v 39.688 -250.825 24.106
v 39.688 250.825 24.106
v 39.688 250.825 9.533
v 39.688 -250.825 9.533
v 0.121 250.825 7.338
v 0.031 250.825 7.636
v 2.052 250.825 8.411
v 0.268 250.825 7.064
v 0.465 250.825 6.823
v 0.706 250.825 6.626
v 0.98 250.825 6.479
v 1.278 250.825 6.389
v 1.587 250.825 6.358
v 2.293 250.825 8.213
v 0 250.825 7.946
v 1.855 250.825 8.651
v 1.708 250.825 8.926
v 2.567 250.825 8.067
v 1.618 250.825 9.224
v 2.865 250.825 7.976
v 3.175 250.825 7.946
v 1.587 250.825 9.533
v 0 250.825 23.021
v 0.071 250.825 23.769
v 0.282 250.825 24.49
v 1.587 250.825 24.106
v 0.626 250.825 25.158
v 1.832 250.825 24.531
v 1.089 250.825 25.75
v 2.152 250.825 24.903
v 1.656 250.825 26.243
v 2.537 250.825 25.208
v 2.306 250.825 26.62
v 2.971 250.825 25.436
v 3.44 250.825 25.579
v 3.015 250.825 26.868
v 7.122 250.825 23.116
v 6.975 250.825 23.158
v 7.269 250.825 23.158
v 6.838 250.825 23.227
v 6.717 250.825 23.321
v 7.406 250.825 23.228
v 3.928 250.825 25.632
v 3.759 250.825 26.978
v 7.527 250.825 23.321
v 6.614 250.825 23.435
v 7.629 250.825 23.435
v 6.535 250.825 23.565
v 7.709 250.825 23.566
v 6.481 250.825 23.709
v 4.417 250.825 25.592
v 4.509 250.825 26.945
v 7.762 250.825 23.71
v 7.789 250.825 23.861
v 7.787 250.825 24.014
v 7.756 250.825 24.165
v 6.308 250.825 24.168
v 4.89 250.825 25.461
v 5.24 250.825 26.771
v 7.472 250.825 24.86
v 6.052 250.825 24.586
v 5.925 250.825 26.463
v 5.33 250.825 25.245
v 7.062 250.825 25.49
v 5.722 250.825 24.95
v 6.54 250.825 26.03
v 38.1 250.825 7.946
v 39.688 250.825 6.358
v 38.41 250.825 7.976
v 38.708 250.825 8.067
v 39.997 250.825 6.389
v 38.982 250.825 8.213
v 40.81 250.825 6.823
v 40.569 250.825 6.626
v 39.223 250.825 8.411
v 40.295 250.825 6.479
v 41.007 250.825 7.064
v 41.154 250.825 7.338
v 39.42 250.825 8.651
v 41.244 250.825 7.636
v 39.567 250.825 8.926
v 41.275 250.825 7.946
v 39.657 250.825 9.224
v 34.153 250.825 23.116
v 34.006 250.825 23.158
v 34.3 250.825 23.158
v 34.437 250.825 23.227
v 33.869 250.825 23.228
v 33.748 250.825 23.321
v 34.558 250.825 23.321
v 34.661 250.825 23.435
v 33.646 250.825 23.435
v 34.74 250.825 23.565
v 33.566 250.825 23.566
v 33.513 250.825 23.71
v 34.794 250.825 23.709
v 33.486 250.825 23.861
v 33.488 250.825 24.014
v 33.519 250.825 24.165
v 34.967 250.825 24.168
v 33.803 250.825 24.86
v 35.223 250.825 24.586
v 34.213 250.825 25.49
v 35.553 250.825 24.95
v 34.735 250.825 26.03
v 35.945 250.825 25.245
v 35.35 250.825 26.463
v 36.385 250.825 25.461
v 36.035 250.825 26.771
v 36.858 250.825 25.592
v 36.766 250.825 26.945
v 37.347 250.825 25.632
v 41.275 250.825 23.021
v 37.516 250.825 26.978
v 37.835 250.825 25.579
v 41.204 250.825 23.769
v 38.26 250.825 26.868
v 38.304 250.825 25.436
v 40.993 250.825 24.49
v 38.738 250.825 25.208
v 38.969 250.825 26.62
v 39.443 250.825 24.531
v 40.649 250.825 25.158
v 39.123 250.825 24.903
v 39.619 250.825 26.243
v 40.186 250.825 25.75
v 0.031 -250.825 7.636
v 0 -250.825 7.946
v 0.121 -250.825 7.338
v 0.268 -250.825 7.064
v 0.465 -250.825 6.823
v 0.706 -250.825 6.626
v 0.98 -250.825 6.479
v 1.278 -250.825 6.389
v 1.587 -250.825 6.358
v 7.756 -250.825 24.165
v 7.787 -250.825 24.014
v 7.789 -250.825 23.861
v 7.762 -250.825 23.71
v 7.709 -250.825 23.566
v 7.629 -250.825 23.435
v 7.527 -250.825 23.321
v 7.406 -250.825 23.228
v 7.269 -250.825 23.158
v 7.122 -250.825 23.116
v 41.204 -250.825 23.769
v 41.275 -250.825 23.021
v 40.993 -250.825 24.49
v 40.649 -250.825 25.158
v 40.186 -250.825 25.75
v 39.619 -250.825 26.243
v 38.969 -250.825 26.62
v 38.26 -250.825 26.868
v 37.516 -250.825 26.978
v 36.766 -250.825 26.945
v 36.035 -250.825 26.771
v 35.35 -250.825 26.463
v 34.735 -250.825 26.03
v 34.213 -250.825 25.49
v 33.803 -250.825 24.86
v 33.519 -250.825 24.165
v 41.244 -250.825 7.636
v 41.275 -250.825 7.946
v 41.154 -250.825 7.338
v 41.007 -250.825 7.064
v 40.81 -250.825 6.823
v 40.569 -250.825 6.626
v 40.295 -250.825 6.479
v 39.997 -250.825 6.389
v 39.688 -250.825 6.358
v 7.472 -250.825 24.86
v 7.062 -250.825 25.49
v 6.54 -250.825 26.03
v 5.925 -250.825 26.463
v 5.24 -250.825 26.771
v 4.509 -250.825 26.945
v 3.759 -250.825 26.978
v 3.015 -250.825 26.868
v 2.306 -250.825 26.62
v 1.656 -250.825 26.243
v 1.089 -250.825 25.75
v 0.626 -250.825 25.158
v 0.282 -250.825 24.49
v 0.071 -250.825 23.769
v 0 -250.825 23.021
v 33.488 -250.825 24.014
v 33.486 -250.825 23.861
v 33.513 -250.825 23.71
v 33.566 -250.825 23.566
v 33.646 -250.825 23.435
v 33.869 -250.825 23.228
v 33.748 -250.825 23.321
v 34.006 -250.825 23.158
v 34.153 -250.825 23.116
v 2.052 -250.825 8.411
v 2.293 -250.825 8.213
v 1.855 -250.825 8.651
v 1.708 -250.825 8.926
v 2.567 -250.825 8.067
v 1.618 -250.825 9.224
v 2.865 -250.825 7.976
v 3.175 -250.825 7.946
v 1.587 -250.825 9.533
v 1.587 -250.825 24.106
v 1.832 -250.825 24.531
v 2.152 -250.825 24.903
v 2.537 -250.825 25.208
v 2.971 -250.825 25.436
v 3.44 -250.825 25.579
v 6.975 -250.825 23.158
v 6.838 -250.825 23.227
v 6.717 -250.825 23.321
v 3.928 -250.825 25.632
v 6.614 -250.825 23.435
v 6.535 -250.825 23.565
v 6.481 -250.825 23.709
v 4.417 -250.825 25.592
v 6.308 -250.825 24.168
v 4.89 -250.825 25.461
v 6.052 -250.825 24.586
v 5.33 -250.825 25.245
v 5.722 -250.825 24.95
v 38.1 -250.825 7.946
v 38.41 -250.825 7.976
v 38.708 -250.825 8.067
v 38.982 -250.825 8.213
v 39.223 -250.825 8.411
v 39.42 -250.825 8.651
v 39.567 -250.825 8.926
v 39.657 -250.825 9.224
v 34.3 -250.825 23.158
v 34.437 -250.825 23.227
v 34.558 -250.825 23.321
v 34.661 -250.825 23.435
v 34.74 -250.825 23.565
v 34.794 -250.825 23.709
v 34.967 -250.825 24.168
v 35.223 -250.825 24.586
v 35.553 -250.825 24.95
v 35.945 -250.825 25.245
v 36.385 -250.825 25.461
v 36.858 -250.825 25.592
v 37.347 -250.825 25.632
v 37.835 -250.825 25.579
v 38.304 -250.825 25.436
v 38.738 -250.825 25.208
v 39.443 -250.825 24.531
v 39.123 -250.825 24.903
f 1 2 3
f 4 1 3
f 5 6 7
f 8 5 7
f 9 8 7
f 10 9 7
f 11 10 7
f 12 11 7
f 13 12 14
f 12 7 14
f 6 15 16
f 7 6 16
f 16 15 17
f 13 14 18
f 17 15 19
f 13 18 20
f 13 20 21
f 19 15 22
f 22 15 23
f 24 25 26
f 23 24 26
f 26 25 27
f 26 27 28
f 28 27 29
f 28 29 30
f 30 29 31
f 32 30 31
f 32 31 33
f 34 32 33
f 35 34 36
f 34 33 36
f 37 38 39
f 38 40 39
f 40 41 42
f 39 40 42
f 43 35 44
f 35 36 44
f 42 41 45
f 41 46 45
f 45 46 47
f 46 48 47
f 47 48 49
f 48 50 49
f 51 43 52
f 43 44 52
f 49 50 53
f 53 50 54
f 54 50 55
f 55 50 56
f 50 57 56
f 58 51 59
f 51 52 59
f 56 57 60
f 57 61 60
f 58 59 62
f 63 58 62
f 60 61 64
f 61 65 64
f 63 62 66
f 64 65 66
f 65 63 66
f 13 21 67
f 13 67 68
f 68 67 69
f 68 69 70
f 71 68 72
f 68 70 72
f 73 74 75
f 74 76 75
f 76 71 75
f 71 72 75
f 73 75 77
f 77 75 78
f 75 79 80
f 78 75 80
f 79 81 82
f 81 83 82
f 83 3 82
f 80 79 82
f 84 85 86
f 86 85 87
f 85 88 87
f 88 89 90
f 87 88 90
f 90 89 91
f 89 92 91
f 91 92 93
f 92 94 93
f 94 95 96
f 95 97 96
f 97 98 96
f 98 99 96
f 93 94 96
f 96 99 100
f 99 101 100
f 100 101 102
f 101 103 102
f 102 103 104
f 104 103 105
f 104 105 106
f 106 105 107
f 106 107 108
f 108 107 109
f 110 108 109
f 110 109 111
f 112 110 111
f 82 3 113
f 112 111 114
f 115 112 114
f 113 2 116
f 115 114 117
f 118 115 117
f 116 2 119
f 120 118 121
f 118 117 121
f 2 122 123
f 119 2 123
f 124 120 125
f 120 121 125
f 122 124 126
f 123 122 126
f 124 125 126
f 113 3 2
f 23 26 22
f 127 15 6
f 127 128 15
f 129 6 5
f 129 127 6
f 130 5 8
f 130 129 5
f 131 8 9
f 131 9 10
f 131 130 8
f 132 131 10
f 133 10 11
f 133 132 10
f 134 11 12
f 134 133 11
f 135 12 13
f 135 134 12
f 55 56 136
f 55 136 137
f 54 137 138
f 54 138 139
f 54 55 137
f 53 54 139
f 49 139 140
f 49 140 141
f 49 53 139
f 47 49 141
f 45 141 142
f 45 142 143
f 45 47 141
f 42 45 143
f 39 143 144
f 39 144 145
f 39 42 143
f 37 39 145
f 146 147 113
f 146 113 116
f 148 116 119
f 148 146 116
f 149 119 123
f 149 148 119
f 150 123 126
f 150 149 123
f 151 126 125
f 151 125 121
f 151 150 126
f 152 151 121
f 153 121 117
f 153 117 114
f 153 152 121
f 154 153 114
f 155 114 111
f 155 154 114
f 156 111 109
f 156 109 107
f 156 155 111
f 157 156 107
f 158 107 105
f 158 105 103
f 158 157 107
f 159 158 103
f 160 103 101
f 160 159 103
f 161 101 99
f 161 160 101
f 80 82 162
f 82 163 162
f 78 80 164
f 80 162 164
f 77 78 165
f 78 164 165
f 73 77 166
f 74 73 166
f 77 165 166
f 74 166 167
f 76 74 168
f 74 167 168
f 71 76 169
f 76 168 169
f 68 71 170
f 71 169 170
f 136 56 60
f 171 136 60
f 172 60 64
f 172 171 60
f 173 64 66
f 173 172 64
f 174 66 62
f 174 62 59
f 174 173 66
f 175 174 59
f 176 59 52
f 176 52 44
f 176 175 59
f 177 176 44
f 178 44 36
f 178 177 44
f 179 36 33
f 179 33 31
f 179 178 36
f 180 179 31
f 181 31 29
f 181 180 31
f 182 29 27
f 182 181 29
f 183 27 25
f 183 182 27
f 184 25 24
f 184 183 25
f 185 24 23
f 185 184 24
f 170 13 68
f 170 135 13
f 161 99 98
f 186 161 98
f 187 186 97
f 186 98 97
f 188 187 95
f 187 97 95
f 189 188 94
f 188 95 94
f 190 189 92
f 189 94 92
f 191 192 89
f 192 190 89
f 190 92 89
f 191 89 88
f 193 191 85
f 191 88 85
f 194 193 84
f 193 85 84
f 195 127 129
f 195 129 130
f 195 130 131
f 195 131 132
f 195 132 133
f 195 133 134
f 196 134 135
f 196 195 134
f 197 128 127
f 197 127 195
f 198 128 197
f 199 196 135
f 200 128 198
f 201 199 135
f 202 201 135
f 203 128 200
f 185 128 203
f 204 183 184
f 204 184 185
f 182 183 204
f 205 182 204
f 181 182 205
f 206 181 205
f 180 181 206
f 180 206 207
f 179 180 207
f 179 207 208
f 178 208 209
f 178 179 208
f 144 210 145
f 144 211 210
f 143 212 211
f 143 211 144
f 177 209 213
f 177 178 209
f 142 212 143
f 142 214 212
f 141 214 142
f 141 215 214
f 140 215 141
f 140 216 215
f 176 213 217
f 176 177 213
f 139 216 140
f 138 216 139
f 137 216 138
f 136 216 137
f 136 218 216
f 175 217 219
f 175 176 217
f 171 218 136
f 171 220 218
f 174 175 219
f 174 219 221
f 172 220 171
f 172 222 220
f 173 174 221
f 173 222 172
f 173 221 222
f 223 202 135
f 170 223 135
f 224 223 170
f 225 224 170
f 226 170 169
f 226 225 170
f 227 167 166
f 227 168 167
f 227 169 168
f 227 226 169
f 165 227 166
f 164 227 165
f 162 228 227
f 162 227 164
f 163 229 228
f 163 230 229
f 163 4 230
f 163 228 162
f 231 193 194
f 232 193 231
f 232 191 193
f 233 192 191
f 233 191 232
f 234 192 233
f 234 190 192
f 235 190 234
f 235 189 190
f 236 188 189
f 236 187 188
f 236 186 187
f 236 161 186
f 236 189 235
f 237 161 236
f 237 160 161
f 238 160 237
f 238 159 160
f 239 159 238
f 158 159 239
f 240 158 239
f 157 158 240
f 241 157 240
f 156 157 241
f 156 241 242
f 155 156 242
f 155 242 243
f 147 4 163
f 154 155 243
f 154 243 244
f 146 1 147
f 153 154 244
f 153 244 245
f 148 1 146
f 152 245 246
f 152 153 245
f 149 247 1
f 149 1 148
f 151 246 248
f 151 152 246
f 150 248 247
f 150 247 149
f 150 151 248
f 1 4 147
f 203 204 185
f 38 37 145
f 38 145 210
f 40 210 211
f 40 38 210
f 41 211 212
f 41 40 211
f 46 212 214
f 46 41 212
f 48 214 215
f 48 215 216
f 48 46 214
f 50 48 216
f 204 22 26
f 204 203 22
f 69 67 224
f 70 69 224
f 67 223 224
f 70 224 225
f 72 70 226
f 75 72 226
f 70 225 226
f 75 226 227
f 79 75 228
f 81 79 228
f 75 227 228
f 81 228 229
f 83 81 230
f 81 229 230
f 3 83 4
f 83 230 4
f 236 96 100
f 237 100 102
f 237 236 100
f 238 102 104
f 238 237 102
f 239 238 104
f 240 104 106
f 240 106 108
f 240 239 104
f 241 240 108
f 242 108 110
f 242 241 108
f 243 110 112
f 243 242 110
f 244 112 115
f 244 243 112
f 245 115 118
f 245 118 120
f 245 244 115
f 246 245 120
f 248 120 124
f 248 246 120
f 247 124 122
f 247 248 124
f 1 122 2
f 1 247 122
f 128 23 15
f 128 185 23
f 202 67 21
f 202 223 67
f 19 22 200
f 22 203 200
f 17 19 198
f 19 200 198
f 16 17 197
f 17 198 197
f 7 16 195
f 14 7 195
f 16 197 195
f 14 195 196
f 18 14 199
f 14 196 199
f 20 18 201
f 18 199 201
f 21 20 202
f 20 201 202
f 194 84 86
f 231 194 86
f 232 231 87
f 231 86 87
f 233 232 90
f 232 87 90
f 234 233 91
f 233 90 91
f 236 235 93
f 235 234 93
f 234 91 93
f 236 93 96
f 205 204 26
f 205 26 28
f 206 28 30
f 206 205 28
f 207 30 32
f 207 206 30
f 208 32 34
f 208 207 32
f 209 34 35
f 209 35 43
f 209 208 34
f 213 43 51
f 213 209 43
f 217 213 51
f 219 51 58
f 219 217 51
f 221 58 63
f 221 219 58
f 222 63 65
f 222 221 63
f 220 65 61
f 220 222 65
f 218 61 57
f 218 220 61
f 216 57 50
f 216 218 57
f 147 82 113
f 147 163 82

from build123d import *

# Parameters (mm, degrees)
F1_DEPTH    = 250.825
F2_R        = 1.5875
F3_T1_DEPTH = 507.0347591504
F3_T3_DEPTH = 505.1764115156


# Not quite as in the source:
# - a fillet or chamfer that OpenCascade refuses, or shapes differently, is made with other operations: its cross-section is extruded or revolved along the edge and cut away or added


with BuildPart() as f1:
    # F0 (on Front) → F1 (new body, symmetric)
    with BuildSketch(Plane.XZ):
        with BuildLine():
            Line((0, 23.0208111631), (0, 6.3584111631))
            Line((0, 6.3584111631), (41.275, 6.3584111631))
            Line((41.275, 6.3584111631), (41.275, 7.9459111631))
            Line((41.275, 7.9459111631), (41.275, 23.0208111631))
            ThreePointArc((41.275, 23.0208111631), (37.3526007198, 26.9830092528), (33.3510076204, 23.1008085261))
            Line((33.3510076204, 23.1008085261), (34.7028554043, 23.1008085261))
            ThreePointArc((34.7028554043, 23.1008085261), (36.7966084578, 25.5802875082), (39.6875, 24.1057150403))
            Line((39.6875, 24.1057150403), (39.6875, 23.1008085261))
            Line((39.6875, 23.1008085261), (39.6875, 7.9459111631))
            Line((39.6875, 7.9459111631), (1.5875, 7.9459111631))
            Line((1.5875, 7.9459111631), (1.5875, 24.1057150403))
            ThreePointArc((1.5875, 24.1057150403), (4.4783915422, 25.5802875082), (6.5721445957, 23.1008085261))
            Line((6.5721445957, 23.1008085261), (7.9239923796, 23.1008085261))
            ThreePointArc((7.9239923796, 23.1008085261), (3.9223992802, 26.9830092528), (0, 23.0208111631))
        make_face()
    extrude(amount=F1_DEPTH, both=True)

    # F2
    f2_edges = [f1.edges().sort_by_distance(p)[0] for p in [
        (39.6875, 0, 7.945911),
        (1.5875, 0, 7.945911),
        (0, 0, 6.358411),
        (41.275, 0, 6.358411),
    ]]
    fillet(f2_edges, radius=F2_R)

    # F3: fillet of radius 0.8255 on 4 edges, made by hand

    # F3_s2 → F3_t1 (cut)
    with BuildSketch(Plane.XZ.offset(-253.5173795752)):
        with BuildLine():
            ThreePointArc((33.5188726746, 24.1645973059), (33.6466023062, 23.4339961952), (34.309232534, 23.1008085261))
            Line((34.309232534, 23.1008085261), (33.3510076204, 23.1008085261))
            ThreePointArc((33.3510076204, 23.1008085261), (33.3986304583, 23.6384325571), (33.5188726746, 24.1645973059))
        make_face()
        with BuildLine():
            ThreePointArc((7.7561273254, 24.1645973059), (7.6283976938, 23.4339961952), (6.965767466, 23.1008085261))
            Line((6.965767466, 23.1008085261), (7.9239923796, 23.1008085261))
            ThreePointArc((7.9239923796, 23.1008085261), (7.8763695417, 23.6384325571), (7.7561273254, 24.1645973059))
        make_face()
    extrude(amount=F3_T1_DEPTH, mode=Mode.SUBTRACT)

    # F3_s4 → F3_t3 (cut)
    with BuildSketch(Plane.XZ.offset(-252.5882057578)):
        with BuildLine():
            ThreePointArc((33.9975731012, 23.1008085261), (34.4985175119, 23.2701797679), (34.7939002584, 23.7087922999))
            ThreePointArc((34.7939002584, 23.7087922999), (34.7304213855, 23.4074893696), (34.7028554043, 23.1008085261))
            Line((34.7028554043, 23.1008085261), (33.9975731012, 23.1008085261))
        make_face()
        with BuildLine():
            ThreePointArc((7.2774268988, 23.1008085261), (6.7764824881, 23.2701797679), (6.4810997416, 23.7087922999))
            ThreePointArc((6.4810997416, 23.7087922999), (6.5445786145, 23.4074893696), (6.5721445957, 23.1008085261))
            Line((6.5721445957, 23.1008085261), (7.2774268988, 23.1008085261))
        make_face()
    extrude(amount=F3_T3_DEPTH, mode=Mode.SUBTRACT)


solid = f1.part
